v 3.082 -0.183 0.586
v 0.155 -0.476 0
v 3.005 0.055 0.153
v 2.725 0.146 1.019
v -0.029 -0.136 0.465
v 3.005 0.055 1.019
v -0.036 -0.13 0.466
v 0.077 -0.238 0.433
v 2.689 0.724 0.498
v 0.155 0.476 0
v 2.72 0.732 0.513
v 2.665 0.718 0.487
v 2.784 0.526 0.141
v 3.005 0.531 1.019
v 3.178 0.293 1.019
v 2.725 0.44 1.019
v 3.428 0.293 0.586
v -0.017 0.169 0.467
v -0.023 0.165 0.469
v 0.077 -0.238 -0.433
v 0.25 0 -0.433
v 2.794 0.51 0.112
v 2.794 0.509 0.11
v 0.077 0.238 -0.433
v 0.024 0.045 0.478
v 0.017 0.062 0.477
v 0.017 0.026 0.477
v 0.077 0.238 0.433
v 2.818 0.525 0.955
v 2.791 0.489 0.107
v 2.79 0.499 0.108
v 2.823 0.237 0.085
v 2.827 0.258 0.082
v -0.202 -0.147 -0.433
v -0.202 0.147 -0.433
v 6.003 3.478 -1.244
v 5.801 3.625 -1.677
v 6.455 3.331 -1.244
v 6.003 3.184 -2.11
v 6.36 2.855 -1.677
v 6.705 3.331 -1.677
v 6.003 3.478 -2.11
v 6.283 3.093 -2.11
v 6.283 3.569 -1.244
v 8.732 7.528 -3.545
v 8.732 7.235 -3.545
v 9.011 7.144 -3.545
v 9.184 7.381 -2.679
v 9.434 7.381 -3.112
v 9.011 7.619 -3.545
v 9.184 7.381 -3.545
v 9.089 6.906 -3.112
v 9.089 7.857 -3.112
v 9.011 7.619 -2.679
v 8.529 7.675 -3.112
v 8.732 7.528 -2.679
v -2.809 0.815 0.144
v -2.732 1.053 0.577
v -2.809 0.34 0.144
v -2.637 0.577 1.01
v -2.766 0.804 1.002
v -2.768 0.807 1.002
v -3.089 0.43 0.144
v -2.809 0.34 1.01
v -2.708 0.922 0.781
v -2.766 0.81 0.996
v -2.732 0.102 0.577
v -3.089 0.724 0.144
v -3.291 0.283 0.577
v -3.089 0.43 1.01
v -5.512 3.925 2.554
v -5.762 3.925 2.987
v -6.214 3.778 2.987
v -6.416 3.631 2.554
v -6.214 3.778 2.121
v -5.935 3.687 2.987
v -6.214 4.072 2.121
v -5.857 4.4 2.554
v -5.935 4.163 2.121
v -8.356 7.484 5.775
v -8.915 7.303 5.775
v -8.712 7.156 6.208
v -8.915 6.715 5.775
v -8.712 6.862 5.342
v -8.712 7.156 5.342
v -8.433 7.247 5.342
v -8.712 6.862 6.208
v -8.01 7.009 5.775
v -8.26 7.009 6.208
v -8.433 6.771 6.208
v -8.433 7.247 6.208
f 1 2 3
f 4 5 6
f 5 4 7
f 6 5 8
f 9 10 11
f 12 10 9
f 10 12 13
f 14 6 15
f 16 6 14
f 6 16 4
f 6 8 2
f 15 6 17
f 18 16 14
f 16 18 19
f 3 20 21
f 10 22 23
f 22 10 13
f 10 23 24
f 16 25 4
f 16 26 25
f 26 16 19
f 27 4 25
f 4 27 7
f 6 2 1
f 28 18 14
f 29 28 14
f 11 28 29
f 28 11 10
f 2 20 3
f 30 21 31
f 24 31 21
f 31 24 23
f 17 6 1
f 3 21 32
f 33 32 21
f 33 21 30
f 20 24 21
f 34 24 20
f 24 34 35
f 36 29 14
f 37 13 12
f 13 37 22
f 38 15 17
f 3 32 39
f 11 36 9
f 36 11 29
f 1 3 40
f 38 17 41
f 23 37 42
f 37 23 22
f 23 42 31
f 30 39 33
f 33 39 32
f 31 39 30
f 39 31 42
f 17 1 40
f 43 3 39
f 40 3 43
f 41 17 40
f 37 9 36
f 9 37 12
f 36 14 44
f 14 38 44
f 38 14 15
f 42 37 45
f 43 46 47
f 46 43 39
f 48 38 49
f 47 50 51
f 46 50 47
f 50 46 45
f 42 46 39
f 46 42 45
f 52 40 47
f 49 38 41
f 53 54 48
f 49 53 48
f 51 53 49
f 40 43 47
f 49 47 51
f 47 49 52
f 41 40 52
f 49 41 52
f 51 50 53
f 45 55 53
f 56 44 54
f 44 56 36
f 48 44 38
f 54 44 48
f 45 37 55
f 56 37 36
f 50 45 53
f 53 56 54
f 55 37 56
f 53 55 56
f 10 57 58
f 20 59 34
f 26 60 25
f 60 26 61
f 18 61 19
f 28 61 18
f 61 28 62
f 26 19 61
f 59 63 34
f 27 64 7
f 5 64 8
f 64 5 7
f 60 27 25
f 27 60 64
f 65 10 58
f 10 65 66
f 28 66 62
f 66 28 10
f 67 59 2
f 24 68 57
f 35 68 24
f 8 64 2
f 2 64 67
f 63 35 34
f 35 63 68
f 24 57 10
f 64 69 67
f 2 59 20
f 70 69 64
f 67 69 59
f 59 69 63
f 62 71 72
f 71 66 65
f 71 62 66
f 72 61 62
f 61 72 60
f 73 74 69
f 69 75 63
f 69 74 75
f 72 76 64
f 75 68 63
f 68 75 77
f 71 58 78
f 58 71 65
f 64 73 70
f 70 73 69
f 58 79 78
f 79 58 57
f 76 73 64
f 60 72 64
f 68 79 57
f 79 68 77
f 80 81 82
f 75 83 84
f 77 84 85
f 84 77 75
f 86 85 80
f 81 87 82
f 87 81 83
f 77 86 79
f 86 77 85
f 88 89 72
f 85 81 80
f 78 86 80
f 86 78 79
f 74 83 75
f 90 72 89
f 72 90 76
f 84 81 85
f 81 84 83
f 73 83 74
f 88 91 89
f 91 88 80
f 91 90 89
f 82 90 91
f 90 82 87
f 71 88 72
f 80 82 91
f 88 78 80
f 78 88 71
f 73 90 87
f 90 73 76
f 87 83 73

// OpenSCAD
hsternum=[0,0,0];
hshouldertarget=[10,cos($t*360*3)*1,cos($t*360*5)*2];
hshoulder=reachfor(hsternum,hshouldertarget,3);
hhandtarget=[12-sin($t*360*0.5)*10,6+cos($t*360*2)*5,2+cos((0.75+0.125+$t)*360*4)*7];
hhand=reachfor(hshoulder,hhandtarget,10);
hbendnorm=p2n(hsternum, hhand, hshoulder+[0,0,1]);
helbow=lerp(hshoulder,hhand,0.5)+hbendnorm*IK(10.1, (hhand-hshoulder));

polyline([hsternum,hshoulder,helbow,hhand]);

sternum=[0,0,0];
shouldertarget=[-10,cos($t*360*3)*2,cos($t*360*5)*2];
shoulder=reachfor(sternum,shouldertarget,3);
handtarget=[-12+sin($t*360*0.5)*10,6+cos($t*360*2)*5,2+cos($t*360*4)*7];
hand=reachfor(shoulder,handtarget,10);
bendnorm=p2n(sternum, shoulder+[0,0,1], hand);
elbow=lerp(shoulder,hand,0.5)+bendnorm*IK(10.1, (hand-shoulder));

polyline([sternum,shoulder,elbow,hand]);

function p2n(pa, pb, pc) =
let (u = pa - pb, v = pa - pc) un([u[1] * v[2] - u[2] * v[1], u[2] *
 v[0] - u[0] * v[2], u[0] * v[1] - u[1] * v[0]
]);

function rndR()=[rands(0,360,1)[0],rands(0,360,1)[1],rands(0,360,1)[0]];
function rndV()=[rands(-1,1,1)[0],rands(-1,1,1)[0],rands(-1,1,1)[0]];

function lerp(start, end, bias) = (end * bias + start * (1 - bias));


function midpointjust(start,end) = start + (end  - start )/2;

 

function limit(limit,v) = v / norm(v) * min(norm(v),limit);

function limhilo(lolimit,hilimit,v) = v / norm(v) * min(max(norm(v),lolimit),hilimit);

function IK(l,v) = sqrt(pow(l / 2,2) - pow(min(norm(v),l) / 2,2));

function flip3(v) = [-v[2],-v[1],v[0]];

function vec4(vec3,i) = [vec3[0],vec3[1],vec3[2],i];
  
function crosst(p1,p2)=[p1[1]*p2[2]-p1[2]*p2[1],p1[2]*p2[0]-p1[0]*p2[2],p1[0]*p2[1]-p1[1]*p2[0]];

function un(v) = v / norm(v);

function mmul(v1,v2) = [v1[0] * v2[0],v1[1] * v2[1],v1[2] * v2[2]];

function rndc()= rands(0,1,3) ;

function reachfor(p1,p2,l)=let(pn=p2-p1) limit(l,pn)+p1;

function beckham(start,end,length,lookat = [0,1,0],bias = 0.5) = midpoint(start,end,bias) + (un(flipxy(end - start)) * un(lookat)[1] * IK(length,(end - start)) + un(flipxz(end - start)) * un(lookat)[2] * IK(length,(end - start)) + un(end - start) * un(lookat)[0] * IK(length,(end - start)));

function pele(start,end,lookat = [0,0,4]) = midpoint(t(start),t(end)) + un(flipxy(t(end) - t(start))) * lookat[1] + un(flipxz(t(end) - t(start))) * lookat[2] + un(t(end) - t(start)) * lookat[0];

function ground(v,h=2)=[v[0],v[1],max(h,v[2])];


function wrap(x,x_max=1,x_min=0) = (((x - x_min) % (x_max - x_min)) + (x_max - x_min)) % (x_max - x_min) + x_min; // wraps numbers inside boundaries

 module polyline(p) {for(i=[0:max(0,len(p)-2)])line(p[i],p[wrap(i+1,len(p)  )]);
} // polyline plotter
module line(p1, p2 ,width=0.5) 
{ // single line plotter
    hull() {
        translate(p1) sphere(width);
        translate(p2) sphere(width);
    }
}
